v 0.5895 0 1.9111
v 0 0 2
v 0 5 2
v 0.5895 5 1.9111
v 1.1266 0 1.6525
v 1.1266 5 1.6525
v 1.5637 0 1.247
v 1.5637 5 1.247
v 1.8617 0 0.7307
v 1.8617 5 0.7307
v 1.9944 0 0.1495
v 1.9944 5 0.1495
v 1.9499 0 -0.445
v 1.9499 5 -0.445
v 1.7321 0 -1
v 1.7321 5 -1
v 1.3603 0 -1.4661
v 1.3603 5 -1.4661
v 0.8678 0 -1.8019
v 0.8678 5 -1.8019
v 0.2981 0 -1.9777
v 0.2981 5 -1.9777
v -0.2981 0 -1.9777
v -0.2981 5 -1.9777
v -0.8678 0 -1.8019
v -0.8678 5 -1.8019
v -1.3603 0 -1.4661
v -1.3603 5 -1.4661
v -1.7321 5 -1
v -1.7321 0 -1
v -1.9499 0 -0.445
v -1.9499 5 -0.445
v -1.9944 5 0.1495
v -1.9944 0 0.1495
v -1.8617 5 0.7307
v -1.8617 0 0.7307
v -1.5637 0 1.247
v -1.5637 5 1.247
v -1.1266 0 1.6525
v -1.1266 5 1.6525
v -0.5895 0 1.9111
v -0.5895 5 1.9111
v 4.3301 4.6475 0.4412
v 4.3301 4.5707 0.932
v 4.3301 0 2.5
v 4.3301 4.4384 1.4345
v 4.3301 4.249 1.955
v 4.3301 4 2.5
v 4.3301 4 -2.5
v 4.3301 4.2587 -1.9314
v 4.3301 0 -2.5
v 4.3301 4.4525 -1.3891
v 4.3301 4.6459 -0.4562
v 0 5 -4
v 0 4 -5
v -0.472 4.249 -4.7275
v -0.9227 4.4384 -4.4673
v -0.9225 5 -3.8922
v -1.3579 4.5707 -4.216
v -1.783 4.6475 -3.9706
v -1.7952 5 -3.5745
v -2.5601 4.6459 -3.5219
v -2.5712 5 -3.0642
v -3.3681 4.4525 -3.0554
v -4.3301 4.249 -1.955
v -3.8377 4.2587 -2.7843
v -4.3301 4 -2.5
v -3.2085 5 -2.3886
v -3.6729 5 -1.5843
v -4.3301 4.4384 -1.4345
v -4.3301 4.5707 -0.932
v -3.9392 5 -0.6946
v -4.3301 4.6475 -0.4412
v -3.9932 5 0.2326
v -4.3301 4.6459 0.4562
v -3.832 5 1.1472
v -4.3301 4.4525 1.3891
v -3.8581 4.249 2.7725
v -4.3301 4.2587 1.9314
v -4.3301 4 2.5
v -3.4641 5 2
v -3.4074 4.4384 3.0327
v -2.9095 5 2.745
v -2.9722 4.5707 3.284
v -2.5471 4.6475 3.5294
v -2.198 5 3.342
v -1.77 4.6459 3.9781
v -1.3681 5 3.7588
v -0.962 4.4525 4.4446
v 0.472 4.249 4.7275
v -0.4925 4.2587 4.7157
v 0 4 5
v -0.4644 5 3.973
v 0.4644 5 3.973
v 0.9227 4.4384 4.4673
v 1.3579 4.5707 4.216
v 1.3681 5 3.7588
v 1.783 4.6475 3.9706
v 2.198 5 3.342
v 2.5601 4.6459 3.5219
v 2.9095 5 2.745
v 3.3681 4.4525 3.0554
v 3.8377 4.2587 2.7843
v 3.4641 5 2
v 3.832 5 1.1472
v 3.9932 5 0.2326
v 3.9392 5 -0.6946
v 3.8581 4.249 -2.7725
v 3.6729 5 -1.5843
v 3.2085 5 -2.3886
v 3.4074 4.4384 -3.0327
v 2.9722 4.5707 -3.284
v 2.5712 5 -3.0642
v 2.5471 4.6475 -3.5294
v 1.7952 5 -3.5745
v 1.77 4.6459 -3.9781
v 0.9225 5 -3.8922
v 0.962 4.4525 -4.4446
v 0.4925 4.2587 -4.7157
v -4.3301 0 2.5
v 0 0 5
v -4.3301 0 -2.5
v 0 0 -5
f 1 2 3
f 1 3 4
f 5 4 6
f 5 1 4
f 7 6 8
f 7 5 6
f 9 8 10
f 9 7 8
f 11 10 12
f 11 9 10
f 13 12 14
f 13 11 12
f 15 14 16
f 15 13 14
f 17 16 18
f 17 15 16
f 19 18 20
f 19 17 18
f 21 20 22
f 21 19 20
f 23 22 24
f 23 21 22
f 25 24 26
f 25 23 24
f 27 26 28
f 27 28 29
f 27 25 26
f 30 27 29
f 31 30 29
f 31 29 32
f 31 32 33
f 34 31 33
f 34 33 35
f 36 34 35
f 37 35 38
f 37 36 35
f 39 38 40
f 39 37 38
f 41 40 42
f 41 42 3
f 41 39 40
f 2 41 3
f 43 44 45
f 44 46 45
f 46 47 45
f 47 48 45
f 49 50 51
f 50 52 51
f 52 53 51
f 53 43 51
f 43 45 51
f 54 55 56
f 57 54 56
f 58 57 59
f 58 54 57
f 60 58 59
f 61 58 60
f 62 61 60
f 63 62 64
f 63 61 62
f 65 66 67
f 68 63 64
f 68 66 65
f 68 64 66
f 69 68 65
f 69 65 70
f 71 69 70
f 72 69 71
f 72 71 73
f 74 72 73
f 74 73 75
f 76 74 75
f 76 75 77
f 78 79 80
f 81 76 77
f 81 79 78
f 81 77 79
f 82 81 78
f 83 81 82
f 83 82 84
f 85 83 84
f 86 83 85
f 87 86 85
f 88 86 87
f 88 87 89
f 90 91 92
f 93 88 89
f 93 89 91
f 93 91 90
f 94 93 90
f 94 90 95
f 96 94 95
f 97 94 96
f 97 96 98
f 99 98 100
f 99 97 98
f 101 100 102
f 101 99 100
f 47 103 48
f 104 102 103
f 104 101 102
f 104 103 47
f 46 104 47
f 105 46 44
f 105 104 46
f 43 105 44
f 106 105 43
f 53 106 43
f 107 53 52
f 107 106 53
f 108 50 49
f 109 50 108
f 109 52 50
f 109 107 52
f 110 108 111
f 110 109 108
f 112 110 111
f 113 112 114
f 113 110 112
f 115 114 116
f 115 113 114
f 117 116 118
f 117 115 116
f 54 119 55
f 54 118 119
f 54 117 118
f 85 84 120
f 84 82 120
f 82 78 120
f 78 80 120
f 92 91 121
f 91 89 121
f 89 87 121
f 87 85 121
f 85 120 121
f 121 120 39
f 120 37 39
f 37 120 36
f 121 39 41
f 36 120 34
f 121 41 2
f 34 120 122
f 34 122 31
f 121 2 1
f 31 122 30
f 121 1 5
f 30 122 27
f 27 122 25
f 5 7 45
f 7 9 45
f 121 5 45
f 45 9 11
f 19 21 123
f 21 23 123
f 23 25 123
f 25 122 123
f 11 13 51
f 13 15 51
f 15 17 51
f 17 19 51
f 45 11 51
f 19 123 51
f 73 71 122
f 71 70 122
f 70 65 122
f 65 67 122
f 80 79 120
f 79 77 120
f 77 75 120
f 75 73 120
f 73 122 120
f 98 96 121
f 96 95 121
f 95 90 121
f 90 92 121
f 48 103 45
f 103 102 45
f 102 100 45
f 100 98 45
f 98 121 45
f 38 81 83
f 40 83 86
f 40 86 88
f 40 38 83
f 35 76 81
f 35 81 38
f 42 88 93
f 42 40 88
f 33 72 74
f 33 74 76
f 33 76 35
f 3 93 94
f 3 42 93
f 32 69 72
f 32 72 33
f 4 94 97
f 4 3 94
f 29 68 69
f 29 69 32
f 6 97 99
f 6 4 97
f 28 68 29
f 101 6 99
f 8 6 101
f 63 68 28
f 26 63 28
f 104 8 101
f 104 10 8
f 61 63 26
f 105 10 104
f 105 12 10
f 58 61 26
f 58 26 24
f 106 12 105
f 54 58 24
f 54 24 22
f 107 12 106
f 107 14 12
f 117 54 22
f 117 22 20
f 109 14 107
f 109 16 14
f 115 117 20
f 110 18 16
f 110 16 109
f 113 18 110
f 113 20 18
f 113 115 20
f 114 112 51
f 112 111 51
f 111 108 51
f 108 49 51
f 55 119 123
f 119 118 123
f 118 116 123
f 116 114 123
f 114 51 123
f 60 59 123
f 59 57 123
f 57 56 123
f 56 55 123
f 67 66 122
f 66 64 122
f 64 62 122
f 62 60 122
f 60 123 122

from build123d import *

# Parameters (mm, degrees)
SKETCH1_R           = 2
BOSS_EXTRUDE1_DEPTH = 5


with BuildPart() as part:
    # Sketch1 → Boss-Extrude1 (new body)
    with BuildSketch(Plane(origin=(0, 0, 0), x_dir=(1, 0, 0), z_dir=(0, 1, 0))):
        Polygon((0, 5), (-4.330127019, 2.5), (-4.330127019, -2.5), (0, -5), (4.330127019, -2.5), (4.330127019, 2.5), align=None)
        with Locations(Location((0, 0, 0), (0, 0, 270))):
            Circle(SKETCH1_R, mode=Mode.SUBTRACT)
    extrude(amount=BOSS_EXTRUDE1_DEPTH)

    # Sketch3 → Cut-Revolve1 (revolve, cut)
    with BuildSketch(Plane(origin=(0, 0, 0), x_dir=(0, 0, -1), z_dir=(1, 0, 0))):
        Polygon((4, 5), (5, 5), (5, 4), align=None)
    revolve(axis=Axis((0, 0, 0), (0, 1, 0)), mode=Mode.SUBTRACT)


solid = part.part
